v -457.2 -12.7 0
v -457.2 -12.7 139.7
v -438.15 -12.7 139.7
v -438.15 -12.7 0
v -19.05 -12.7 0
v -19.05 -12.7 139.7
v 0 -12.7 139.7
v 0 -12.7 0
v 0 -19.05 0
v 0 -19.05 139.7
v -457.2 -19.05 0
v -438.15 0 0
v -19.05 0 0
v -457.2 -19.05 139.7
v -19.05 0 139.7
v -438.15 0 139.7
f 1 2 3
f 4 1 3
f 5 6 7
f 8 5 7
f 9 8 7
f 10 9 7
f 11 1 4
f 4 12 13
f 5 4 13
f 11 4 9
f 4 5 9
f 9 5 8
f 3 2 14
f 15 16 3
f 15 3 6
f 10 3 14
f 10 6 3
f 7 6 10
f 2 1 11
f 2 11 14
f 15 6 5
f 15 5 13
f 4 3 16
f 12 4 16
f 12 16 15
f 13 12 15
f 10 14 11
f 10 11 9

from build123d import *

# Parameters (mm, degrees)
F0_W     = 457.2
F0_H     = 139.7
F1_DEPTH = 19.05
F2_W     = 19.05
F2_H     = 12.7
F3_DEPTH = 139.701
F4_W     = 19.05
F4_H     = 12.7
F5_DEPTH = 139.701


with BuildPart() as f1:
    # F0 (on Front) → F1 (new body)
    with BuildSketch(Plane.XZ):
        with Locations((-228.6, 69.85)):
            Rectangle(F0_W, F0_H)
    extrude(amount=F1_DEPTH)

    # F2 (on face) → F3 (cut, through all)
    with BuildSketch(Plane.XY.offset(139.7)):
        with Locations((-9.525, -6.35)):
            Rectangle(F2_W, F2_H)
    extrude(amount=-F3_DEPTH, mode=Mode.SUBTRACT)

    # F4 (on face) → F5 (cut, through all)
    with BuildSketch(Plane.XY.offset(139.7)):
        with Locations((-447.675, -6.35)):
            Rectangle(F4_W, F4_H)
    extrude(amount=-F5_DEPTH, mode=Mode.SUBTRACT)


solid = f1.part
